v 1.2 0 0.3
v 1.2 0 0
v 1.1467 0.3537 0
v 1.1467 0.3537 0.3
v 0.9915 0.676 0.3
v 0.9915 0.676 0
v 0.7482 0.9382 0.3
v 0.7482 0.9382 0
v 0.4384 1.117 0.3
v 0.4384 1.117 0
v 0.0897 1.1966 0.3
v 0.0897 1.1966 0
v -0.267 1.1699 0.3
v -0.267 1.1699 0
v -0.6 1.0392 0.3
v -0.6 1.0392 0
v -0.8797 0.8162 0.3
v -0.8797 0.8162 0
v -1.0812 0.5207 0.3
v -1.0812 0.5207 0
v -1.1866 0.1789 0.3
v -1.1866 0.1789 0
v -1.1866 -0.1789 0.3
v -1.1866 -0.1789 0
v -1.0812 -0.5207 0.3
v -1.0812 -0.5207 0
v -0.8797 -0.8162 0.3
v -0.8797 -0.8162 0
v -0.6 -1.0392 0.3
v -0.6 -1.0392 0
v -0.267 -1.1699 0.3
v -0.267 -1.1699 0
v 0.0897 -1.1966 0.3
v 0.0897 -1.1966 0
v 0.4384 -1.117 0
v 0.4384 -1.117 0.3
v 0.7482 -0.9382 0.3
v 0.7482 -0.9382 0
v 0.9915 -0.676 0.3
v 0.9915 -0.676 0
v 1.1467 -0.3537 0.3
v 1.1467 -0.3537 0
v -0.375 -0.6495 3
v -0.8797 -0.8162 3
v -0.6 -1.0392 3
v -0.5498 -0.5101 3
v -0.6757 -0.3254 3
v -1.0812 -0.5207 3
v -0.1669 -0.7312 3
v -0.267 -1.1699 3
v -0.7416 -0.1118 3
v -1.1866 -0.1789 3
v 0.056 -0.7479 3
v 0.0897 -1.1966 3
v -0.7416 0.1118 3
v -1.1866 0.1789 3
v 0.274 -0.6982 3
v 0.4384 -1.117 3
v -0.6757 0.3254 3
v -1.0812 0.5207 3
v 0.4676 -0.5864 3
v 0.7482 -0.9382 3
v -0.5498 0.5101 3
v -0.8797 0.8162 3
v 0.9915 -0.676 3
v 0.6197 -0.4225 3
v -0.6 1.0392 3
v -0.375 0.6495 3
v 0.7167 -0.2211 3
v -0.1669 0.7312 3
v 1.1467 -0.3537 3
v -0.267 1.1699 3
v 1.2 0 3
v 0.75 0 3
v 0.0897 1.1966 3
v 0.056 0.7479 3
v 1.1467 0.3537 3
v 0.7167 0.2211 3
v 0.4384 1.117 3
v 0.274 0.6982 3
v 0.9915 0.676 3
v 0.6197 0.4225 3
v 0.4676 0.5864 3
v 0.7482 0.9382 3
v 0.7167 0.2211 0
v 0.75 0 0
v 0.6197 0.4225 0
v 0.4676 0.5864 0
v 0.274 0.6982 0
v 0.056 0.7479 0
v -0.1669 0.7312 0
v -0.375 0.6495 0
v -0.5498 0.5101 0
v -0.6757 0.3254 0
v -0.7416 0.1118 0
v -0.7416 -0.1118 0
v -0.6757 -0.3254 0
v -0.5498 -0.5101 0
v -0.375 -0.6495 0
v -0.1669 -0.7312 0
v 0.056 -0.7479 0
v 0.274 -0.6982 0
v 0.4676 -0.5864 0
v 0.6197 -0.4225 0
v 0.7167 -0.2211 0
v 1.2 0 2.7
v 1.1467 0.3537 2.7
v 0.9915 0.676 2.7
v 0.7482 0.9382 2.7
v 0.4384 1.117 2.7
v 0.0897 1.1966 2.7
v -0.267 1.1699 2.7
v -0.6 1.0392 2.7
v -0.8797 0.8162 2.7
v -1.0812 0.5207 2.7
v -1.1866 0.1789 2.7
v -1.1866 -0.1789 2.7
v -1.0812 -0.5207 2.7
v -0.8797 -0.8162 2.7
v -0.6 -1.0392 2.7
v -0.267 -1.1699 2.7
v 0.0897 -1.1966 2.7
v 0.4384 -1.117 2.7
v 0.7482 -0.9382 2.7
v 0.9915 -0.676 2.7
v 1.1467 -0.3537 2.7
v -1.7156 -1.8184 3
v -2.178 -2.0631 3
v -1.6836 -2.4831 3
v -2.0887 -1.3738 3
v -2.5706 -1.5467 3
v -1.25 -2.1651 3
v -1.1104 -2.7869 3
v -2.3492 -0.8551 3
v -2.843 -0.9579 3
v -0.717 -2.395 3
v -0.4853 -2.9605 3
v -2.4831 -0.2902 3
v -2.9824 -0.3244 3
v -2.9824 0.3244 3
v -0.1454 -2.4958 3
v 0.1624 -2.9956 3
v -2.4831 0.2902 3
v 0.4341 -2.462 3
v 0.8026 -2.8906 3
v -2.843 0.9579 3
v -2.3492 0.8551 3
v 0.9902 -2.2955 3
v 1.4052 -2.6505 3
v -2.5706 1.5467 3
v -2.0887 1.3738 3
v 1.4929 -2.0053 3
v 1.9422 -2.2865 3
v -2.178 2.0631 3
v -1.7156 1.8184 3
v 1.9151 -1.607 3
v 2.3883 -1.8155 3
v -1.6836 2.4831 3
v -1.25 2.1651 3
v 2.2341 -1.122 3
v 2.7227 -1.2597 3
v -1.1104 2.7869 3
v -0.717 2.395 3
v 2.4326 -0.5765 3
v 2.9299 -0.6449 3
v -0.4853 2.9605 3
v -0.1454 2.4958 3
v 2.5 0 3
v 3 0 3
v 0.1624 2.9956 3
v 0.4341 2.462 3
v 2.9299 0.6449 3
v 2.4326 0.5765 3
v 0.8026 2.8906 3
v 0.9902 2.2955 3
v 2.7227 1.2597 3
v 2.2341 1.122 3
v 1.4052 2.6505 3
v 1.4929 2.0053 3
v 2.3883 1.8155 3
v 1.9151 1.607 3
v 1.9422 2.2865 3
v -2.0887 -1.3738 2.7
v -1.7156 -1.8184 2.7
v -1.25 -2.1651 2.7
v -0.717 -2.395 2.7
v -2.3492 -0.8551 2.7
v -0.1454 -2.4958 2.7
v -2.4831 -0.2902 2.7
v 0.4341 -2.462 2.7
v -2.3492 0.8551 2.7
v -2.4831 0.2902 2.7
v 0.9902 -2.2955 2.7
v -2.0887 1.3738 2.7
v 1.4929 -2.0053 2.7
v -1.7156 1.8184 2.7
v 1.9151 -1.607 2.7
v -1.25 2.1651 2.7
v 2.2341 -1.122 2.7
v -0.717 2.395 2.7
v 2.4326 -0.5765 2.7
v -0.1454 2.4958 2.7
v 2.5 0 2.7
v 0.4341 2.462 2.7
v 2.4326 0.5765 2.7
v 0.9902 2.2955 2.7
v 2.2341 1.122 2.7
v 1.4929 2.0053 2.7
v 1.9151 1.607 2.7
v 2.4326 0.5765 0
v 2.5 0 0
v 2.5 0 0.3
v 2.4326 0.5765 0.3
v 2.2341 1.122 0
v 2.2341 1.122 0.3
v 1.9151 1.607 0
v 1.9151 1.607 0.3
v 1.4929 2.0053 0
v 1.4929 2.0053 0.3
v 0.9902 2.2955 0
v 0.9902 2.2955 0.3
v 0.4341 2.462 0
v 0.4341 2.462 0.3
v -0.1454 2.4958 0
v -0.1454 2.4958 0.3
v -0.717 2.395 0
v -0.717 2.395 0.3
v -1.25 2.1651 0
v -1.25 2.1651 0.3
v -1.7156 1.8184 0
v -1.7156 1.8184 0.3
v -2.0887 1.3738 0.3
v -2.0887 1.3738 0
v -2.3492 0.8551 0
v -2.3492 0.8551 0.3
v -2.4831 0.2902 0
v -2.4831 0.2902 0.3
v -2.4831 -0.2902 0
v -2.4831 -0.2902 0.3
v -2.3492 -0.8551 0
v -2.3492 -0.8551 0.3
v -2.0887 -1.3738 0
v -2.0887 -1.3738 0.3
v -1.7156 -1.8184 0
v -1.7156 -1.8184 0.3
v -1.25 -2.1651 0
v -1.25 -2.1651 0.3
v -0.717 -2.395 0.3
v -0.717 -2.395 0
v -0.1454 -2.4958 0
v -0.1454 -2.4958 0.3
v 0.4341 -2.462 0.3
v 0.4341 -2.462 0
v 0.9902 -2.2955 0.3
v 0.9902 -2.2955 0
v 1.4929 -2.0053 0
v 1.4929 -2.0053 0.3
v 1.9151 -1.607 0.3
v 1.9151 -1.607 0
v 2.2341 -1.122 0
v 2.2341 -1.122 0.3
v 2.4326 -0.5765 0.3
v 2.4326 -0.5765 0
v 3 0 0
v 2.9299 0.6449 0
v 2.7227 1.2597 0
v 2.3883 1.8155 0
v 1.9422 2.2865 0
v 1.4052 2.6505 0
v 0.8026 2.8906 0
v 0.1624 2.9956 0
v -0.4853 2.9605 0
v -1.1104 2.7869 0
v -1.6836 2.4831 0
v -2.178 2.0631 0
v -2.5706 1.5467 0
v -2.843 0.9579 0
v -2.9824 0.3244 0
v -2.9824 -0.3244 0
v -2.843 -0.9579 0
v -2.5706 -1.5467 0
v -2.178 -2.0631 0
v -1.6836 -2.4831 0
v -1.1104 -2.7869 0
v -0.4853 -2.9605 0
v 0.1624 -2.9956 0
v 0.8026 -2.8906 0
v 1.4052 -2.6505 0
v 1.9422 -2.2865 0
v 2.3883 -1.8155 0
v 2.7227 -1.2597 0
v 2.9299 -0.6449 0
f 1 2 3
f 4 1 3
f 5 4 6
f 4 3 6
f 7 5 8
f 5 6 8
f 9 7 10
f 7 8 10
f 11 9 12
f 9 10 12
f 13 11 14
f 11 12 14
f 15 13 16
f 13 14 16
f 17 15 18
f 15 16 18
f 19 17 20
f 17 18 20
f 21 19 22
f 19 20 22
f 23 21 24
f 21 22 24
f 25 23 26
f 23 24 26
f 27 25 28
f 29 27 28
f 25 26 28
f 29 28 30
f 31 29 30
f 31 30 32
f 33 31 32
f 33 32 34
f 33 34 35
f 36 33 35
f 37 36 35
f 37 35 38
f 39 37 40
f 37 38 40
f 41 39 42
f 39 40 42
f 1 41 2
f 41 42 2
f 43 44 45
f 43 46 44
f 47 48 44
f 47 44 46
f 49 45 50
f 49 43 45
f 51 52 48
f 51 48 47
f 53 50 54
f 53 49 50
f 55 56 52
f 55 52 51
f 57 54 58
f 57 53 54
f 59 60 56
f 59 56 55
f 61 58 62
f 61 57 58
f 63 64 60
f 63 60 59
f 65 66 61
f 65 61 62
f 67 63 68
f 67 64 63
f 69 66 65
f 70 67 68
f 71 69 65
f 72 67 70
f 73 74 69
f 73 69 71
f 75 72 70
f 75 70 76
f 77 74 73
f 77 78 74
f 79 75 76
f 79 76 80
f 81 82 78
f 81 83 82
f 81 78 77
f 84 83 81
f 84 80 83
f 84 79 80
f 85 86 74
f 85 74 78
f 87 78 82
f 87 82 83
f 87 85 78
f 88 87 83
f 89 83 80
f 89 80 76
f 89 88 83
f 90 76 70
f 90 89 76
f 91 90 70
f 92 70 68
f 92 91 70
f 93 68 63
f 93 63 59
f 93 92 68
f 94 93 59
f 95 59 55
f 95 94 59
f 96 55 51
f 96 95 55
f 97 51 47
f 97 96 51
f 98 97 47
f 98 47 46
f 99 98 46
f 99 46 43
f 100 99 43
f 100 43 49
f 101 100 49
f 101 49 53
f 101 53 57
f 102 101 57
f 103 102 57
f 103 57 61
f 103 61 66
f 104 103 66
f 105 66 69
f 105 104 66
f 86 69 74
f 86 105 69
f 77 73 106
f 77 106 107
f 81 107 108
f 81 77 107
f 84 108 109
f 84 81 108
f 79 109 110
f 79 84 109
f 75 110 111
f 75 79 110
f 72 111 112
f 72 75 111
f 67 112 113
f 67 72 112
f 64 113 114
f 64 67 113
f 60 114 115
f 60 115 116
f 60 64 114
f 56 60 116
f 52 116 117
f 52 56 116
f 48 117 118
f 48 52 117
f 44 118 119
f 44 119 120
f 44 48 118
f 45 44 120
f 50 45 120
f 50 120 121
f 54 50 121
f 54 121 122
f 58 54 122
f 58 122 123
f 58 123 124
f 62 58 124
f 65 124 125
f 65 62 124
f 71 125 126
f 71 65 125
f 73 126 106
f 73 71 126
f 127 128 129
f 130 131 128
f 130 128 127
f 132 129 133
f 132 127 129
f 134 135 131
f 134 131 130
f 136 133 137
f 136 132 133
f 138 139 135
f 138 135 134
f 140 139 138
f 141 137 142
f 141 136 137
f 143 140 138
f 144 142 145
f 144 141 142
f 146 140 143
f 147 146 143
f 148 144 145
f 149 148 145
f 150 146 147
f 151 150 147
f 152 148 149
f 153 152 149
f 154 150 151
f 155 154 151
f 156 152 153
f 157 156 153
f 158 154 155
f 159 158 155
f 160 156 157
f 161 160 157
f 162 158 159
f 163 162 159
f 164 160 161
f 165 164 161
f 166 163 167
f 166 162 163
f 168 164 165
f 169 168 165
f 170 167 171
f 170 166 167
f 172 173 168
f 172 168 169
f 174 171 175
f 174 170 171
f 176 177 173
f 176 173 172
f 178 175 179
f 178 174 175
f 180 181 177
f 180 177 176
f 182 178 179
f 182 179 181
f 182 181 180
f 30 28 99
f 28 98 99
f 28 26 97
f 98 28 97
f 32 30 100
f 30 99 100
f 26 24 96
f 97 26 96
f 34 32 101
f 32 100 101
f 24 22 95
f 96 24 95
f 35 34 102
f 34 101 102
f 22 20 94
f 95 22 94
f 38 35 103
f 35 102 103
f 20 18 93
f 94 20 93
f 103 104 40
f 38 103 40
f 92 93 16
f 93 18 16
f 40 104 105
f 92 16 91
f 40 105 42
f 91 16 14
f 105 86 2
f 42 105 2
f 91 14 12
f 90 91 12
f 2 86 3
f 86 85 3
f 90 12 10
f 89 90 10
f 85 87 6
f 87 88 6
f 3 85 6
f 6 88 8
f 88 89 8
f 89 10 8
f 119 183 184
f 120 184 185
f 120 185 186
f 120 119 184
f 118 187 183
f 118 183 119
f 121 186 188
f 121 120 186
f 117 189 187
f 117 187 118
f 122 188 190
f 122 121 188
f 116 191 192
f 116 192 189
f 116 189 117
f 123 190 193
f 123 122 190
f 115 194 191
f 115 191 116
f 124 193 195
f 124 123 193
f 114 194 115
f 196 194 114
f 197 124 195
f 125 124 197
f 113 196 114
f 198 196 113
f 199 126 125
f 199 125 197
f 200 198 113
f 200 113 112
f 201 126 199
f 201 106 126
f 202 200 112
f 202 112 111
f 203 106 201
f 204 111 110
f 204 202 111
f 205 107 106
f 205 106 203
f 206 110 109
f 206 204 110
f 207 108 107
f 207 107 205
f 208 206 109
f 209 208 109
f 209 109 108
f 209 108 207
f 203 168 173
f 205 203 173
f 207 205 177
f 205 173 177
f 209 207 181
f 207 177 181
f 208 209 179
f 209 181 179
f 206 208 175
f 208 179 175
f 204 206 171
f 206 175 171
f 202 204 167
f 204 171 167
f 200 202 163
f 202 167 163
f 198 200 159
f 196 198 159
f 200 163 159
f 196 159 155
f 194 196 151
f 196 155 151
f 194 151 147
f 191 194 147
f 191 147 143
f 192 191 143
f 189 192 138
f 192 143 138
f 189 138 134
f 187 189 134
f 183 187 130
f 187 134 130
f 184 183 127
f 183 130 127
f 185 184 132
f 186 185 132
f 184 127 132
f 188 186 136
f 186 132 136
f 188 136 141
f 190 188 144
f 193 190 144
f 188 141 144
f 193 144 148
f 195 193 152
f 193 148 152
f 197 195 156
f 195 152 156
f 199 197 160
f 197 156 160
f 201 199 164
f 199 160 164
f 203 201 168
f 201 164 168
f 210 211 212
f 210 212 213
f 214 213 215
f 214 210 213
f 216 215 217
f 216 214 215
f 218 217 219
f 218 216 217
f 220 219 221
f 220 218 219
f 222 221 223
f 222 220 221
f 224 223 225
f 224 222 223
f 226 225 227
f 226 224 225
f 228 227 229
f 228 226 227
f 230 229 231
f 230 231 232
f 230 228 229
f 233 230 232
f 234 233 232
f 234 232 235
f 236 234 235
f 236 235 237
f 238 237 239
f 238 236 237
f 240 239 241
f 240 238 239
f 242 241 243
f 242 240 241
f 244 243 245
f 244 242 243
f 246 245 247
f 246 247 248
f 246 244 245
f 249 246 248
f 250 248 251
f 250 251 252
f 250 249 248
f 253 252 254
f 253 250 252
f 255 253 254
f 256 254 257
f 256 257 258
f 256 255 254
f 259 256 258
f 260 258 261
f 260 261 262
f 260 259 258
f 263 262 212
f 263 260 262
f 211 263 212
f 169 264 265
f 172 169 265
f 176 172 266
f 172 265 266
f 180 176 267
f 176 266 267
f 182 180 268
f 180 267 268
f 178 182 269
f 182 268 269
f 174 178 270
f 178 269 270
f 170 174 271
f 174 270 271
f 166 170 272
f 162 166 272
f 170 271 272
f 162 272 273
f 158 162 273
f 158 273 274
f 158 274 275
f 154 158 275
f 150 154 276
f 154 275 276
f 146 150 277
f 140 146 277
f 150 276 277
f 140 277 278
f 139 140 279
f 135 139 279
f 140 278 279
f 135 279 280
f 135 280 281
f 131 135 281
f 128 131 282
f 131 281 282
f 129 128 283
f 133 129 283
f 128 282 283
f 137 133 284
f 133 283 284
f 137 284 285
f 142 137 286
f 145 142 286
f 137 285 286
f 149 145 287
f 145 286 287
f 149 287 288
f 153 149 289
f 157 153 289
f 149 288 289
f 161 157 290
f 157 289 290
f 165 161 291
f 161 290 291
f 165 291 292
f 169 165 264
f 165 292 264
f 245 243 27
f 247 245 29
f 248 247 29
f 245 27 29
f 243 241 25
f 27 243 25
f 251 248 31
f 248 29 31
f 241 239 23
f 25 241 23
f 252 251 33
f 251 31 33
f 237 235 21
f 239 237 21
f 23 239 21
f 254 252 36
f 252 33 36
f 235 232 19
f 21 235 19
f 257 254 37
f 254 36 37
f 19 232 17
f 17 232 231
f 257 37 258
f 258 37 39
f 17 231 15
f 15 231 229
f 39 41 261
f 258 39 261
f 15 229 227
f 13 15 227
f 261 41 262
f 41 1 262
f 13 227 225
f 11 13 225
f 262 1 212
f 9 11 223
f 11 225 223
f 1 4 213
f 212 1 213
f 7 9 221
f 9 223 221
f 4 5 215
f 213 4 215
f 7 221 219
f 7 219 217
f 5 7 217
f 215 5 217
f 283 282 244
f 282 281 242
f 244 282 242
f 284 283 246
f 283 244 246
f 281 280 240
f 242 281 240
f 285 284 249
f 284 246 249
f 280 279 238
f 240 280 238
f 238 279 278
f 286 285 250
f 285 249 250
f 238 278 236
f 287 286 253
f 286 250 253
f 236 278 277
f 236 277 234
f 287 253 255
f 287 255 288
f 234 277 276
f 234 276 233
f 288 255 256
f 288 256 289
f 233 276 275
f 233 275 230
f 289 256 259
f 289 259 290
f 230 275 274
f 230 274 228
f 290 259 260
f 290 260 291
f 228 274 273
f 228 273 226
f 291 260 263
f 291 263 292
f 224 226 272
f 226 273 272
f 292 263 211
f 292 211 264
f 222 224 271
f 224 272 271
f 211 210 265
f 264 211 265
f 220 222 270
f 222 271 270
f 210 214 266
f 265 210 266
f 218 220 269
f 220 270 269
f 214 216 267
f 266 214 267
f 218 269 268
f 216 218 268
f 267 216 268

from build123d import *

# Parameters (mm, degrees)
SKETCH1_R           = 3
SKETCH1_R_2         = 0.75
BOSS_EXTRUDE1_DEPTH = 3
SKETCH2_R           = 2.5
SKETCH2_R_2         = 1.2
CUT_EXTRUDE1_DEPTH  = 0.3
CUT_EXTRUDE2_START  = -3
SKETCH2_2_R         = 2.5
SKETCH2_2_R_2       = 1.2
CUT_EXTRUDE2_DEPTH  = 0.3


with BuildPart() as part:
    # Sketch1 → Boss-Extrude1 (new body)
    with BuildSketch(Plane.XY):
        Circle(SKETCH1_R)
        Circle(SKETCH1_R_2, mode=Mode.SUBTRACT)
    extrude(amount=BOSS_EXTRUDE1_DEPTH)

    # Sketch2 → Cut-Extrude1 (cut)
    with BuildSketch(Plane.XY.offset(3)):
        Circle(SKETCH2_R)
        Circle(SKETCH2_R_2, mode=Mode.SUBTRACT)
    extrude(amount=-CUT_EXTRUDE1_DEPTH, mode=Mode.SUBTRACT)

    # Sketch2<2> → Cut-Extrude2 (cut)
    with BuildSketch(Plane.XY.offset(3).offset(CUT_EXTRUDE2_START)):
        Circle(SKETCH2_2_R)
        Circle(SKETCH2_2_R_2, mode=Mode.SUBTRACT)
    extrude(amount=CUT_EXTRUDE2_DEPTH, mode=Mode.SUBTRACT)


solid = part.part
